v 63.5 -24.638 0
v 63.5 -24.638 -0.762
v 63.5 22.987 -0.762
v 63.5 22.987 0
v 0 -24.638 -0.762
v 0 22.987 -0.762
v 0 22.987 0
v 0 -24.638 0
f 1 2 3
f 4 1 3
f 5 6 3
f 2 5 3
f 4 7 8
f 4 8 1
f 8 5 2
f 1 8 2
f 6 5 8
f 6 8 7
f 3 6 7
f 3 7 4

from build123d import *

# Parameters (mm, degrees)
F0_W     = 63.5
F0_H     = 47.625
F1_DEPTH = 0.762


with BuildPart() as f1:
    # F0 (on Top) → F1 (new body)
    with BuildSketch(Plane.XY):
        with Locations((38.5716339052, 3.8929983824)):
            Rectangle(F0_W, F0_H)
    extrude(amount=F1_DEPTH)


with BuildPart() as f1_1:
    # F2: moved
    add(f1.part.moved(Location((-6.8216339052, 19.9195016176, -0.762))))


with BuildPart() as f1_2:
    # F3: moved
    add(f1_1.part.moved(Location((0, -24.638, 0))))


solid = f1_2.part
